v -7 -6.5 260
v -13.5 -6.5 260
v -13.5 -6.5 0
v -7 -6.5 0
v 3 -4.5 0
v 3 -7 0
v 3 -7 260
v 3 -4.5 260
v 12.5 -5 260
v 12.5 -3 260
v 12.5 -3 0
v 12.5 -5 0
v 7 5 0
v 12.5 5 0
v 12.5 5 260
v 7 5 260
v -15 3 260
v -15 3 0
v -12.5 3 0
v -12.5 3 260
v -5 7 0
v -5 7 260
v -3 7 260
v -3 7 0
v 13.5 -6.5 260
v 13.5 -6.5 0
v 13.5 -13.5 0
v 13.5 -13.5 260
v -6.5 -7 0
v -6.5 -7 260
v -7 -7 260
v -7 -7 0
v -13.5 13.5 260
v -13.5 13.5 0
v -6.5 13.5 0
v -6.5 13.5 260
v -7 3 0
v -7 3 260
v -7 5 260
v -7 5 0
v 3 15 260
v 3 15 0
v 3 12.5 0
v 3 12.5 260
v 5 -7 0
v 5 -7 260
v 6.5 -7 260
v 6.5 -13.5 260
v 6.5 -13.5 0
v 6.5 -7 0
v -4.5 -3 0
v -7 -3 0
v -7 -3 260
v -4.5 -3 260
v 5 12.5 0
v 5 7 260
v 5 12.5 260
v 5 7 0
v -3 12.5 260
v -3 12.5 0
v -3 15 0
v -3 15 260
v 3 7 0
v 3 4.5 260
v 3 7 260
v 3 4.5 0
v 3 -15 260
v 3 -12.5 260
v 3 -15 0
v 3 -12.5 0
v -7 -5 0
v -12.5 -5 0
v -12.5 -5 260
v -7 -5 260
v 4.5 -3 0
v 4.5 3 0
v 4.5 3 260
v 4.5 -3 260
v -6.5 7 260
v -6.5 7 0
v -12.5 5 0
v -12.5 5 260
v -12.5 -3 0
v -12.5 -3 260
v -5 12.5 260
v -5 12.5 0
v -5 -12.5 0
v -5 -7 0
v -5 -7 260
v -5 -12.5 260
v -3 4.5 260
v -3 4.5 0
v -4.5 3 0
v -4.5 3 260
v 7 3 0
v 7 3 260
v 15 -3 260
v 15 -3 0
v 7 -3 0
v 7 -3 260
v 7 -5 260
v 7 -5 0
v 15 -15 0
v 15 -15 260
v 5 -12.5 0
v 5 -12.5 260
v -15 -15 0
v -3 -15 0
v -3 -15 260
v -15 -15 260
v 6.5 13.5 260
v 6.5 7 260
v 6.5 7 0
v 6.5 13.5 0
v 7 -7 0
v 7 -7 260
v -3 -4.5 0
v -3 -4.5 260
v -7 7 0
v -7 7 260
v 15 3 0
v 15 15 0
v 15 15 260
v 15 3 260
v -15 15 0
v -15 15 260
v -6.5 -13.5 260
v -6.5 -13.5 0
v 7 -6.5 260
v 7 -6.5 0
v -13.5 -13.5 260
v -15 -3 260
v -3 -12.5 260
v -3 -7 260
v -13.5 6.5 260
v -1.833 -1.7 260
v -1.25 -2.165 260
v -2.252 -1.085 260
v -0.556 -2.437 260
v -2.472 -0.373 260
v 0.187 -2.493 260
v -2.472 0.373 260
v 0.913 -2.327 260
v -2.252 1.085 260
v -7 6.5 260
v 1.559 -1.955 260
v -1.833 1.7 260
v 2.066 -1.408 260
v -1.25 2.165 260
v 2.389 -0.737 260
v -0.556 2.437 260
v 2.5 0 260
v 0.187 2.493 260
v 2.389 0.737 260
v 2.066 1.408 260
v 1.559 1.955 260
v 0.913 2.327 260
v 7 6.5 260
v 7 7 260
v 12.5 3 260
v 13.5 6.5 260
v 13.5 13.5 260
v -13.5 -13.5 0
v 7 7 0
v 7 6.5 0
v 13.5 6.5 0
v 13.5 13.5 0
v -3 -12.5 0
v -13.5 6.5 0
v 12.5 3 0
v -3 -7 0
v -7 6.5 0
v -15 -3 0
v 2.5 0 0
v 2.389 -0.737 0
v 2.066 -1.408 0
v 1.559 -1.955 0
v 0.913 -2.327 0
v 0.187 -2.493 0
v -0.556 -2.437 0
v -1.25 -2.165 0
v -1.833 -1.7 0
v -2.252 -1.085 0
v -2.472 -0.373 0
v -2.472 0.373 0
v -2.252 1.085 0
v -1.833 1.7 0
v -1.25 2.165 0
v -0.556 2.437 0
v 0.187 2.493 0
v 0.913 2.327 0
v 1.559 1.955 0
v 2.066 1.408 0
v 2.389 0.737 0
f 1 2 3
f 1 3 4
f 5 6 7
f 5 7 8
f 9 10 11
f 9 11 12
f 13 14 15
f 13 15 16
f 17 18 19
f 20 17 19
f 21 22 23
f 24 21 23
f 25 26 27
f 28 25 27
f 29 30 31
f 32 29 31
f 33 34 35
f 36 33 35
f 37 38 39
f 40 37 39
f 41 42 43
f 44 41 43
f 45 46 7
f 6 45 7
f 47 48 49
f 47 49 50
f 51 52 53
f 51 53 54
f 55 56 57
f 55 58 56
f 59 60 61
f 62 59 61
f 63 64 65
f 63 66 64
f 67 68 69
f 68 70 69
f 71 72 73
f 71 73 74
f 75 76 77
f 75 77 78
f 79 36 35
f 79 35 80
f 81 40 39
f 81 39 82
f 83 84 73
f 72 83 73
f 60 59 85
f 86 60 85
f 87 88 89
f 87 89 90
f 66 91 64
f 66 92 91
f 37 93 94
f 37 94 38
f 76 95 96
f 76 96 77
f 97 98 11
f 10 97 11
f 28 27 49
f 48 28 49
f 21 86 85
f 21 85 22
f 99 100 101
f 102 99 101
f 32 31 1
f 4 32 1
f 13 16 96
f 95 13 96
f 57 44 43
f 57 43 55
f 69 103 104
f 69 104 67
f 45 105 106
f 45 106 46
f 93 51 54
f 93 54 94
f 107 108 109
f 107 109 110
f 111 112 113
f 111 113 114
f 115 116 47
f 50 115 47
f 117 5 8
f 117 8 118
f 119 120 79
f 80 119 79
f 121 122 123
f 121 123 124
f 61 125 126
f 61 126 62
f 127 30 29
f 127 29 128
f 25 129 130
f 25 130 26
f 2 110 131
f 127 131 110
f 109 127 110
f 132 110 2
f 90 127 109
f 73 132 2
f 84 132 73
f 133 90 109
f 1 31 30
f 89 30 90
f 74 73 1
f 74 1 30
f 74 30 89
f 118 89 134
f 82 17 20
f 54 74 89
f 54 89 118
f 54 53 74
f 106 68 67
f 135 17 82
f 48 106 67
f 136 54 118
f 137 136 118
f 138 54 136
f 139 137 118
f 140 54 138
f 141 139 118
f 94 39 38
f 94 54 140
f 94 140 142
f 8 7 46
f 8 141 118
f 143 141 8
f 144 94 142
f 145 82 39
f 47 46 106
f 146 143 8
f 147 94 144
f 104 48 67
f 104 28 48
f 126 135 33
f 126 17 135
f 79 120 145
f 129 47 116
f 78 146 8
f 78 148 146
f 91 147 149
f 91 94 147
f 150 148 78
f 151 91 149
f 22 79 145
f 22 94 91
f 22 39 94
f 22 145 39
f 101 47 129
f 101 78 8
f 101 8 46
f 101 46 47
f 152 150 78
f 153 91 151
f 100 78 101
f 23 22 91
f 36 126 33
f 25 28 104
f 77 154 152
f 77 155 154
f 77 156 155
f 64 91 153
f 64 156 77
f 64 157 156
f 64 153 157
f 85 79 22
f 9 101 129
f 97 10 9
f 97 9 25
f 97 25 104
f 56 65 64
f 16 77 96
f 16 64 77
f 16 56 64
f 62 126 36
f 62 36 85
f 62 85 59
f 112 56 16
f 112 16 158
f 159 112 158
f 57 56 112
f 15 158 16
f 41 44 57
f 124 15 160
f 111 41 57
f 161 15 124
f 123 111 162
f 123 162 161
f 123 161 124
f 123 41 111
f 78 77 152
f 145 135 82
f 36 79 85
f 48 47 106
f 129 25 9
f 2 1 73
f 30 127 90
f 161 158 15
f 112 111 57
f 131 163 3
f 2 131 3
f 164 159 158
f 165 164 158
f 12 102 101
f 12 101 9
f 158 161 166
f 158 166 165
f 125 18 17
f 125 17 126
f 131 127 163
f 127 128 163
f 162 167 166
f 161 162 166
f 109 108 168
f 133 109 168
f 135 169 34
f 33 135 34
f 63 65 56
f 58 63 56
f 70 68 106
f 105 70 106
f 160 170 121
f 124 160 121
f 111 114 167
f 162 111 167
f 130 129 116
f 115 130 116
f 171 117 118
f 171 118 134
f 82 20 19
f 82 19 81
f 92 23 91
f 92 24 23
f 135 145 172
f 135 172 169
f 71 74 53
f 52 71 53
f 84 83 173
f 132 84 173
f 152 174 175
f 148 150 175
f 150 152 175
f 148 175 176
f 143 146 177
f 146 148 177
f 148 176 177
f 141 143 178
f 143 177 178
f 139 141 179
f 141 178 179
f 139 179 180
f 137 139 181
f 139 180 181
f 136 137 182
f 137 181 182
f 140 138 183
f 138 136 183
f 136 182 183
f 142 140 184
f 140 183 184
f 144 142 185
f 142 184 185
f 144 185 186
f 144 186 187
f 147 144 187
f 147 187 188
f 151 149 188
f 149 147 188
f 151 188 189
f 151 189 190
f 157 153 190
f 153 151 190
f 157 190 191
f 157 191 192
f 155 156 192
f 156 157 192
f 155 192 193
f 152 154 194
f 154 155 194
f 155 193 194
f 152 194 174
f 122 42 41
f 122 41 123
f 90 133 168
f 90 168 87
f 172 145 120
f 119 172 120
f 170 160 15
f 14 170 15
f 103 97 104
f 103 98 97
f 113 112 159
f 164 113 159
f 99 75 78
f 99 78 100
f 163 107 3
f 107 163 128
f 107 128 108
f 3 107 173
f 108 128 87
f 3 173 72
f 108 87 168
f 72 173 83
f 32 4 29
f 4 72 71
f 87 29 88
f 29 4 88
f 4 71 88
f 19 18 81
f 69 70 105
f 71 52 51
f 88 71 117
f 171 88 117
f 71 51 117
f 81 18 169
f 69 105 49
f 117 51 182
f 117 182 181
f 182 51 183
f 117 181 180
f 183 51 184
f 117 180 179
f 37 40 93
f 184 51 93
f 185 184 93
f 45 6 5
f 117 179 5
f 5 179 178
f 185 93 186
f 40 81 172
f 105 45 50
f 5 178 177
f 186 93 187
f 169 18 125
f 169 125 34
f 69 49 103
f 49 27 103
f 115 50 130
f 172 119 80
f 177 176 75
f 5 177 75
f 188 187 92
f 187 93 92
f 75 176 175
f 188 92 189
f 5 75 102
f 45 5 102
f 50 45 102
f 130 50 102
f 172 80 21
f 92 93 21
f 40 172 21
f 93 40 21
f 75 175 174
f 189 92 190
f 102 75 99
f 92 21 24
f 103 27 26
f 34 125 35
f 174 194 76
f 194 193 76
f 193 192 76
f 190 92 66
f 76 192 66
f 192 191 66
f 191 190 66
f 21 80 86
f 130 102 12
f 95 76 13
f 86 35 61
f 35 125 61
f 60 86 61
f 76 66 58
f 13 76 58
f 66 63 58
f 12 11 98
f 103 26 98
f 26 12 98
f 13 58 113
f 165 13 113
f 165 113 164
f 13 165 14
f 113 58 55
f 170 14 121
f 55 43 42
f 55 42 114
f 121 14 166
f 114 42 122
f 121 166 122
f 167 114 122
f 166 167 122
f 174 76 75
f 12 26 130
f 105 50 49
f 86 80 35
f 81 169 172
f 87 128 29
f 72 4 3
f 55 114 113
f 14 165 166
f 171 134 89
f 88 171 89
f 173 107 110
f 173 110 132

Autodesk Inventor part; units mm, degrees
ref_plane "YZ Plane" through (0, 0, 0) normal (1, 0, 0) x (0, 1, 0)
ref_plane "XZ Plane" through (0, 0, 0) normal (0, 1, 0) x (-1, 0, 0)
ref_plane "XY Plane" through (0, 0, 0) normal (0, 0, 1) x (1, 0, 0)
sketch "スケッチ1" plane through (0, 0, 0) normal (0, 0, 1) x (1, 0, 0)
  circle A0 centre (0, 0) radius 2.5
  line L0 (-15, 15) -> (15, 15)
  line L1 (15, 15) -> (15, -15)
  line L2 (15, -15) -> (-15, -15)
  line L3 (-15, -15) -> (-15, 15)
  line L4 (-15, 15) -> (15, -15) construction
  line L5 (15, 15) -> (-15, -15) construction
  line L6 (-3, 17.5) -> (3, 17.5)
  line L7 (3, 17.5) -> (3, 12.5)
  line L8 (3, 12.5) -> (-3, 12.5) construction
  line L9 (-3, 12.5) -> (-3, 17.5)
  line L10 (-3, 17.5) -> (3, 12.5) construction
  line L11 (3, 17.5) -> (-3, 12.5) construction
  line L12 (4.5, -4.5) -> (-4.5, -4.5)
  line L13 (-4.5, -4.5) -> (-4.5, 4.5)
  line L14 (-4.5, 4.5) -> (4.5, 4.5)
  line L15 (4.5, 4.5) -> (4.5, -4.5)
  line L16 (4.5, -4.5) -> (-4.5, 4.5) construction
  line L17 (-4.5, -4.5) -> (4.5, 4.5) construction
  line L18 (-7, 7) -> (7, 7)
  line L19 (7, 7) -> (7, -7)
  line L20 (7, -7) -> (-7, -7)
  line L21 (-7, -7) -> (-7, 7)
  line L22 (-7, 7) -> (7, -7) construction
  line L23 (7, 7) -> (-7, -7) construction
  line L24 (-7, 7) -> (-3, 7)
  line L25 (-3, 7) -> (-3, 3)
  line L26 (-3, 3) -> (-7, 3)
  line L27 (-7, 3) -> (-7, 7)
  line L28 (-7, -3) -> (-3, -3)
  line L29 (-3, -3) -> (-3, -7)
  line L30 (3, -7) -> (3, -3)
  line L31 (3, -3) -> (7, -3)
  line L32 (7, 3) -> (3, 3)
  line L33 (3, 3) -> (3, 7)
  line L34 (-15, 15) -> (-5, 15)
  line L35 (-5, 15) -> (-5, 5)
  line L36 (-5, 5) -> (-15, 5)
  line L37 (-15, 5) -> (-15, 15)
  line L38 (-15, -5) -> (-5, -5)
  line L39 (-5, -5) -> (-5, -15)
  line L40 (5, -15) -> (5, -5)
  line L41 (5, -5) -> (15, -5)
  line L42 (15, 5) -> (5, 5)
  line L43 (5, 5) -> (5, 15)
  line L44 (-3, 12.5) -> (-5, 12.5)
  line L45 (3, 12.5) -> (5, 12.5)
  line L46 (-12.5, -3) -> (-12.5, -5)
  line L47 (-12.5, -3) -> (-17.5, -3)
  line L48 (-17.5, 3) -> (-12.5, 3)
  line L49 (-12.5, 3) -> (-12.5, 5)
  line L50 (3, -12.5) -> (5, -12.5)
  line L51 (3, -12.5) -> (3, -17.5)
  line L52 (-3, -17.5) -> (-3, -12.5)
  line L53 (-3, -12.5) -> (-5, -12.5)
  line L54 (12.5, 3) -> (12.5, 5)
  line L55 (12.5, 3) -> (17.5, 3)
  line L56 (17.5, -3) -> (12.5, -3)
  line L57 (12.5, -3) -> (12.5, -5)
  line L58 (-13.5, 13.5) -> (-6.5, 13.5)
  line L59 (-6.5, 13.5) -> (-6.5, 6.5)
  line L60 (-6.5, 6.5) -> (-13.5, 6.5)
  line L61 (-13.5, 6.5) -> (-13.5, 13.5)
  point P0 (0, 15)
  point P1 (-7, 5)
  point P2 (-4.5, 3)
  point P3 (-4.5, -3)
  point P4 (-7, -5)
  point P5 (-15, -3)
  point P6 (-3, -15)
  point P7 (-5, -7)
  point P8 (-3, -4.5)
  point P9 (3, -4.5)
  point P10 (5, -7)
  point P11 (3, -15)
  point P12 (15, -3)
  point P13 (7, -5)
  point P14 (4.5, -3)
  point P15 (4.5, 3)
  point P16 (7, 5)
  point P17 (15, 3)
  point P18 (3, 15)
  point P19 (5, 7)
  point P20 (3, 4.5)
  point P21 (-3, 4.5)
  point P22 (-5, 7)
  point P23 (-3, 15)
  point P24 (-15, 3)
  point P25 (-7, 6.5)
  point P26 (-6.5, 7)
  dimension "d0" = 5
  dimension "d1" = 30
  dimension "d2" = 30
  dimension "d3" = 6
  dimension "d4" = 5
  dimension "d5" = 9
  dimension "d6" = 9
  dimension "d7" = 14
  dimension "d8" = 14
  dimension "d9" = 4
  dimension "d10" = 4
  dimension "d13" = 360
  dimension "d15" = 10
  dimension "d16" = 10
  dimension "d19" = 360
  dimension "d23" = 360
  dimension "d27" = 1.5
  dimension "d28" = 7
extrude "押し出し1" add sketch "スケッチ1" along normal blind 260 contours L0 L35 L18 L59 L58 L61 L60 L21 L36 L3 | L0 L9 L44 L35 | L36 L49 L48 L3 | L0 L43 L45 L7 | L35 L36 L21 L60 L59 L18 | L18 L25 L14 L13 L26 L21 L36 L35 | L47 L46 L38 L3 | L0 L1 L42 L19 L18 L43 | L59 L60 L21 L18 | L18 L21 L60 L61 L58 L59 | L38 L21 L20 L39 L2 L3 | L18 L43 L42 L19 L32 L15 L14 L33 | L25 L26 L13 L14 | L14 L33 L32 L15 L31 L30 L12 L29 L28 L13 L26 L25 | L28 L13 L12 L29 L20 L39 L38 L21 | L1 L55 L54 L42 | L18 L19 L42 L43 | L14 L15 L32 L33 | L39 L53 L52 L2 | L38 L39 L20 L21 | L28 L29 L12 L13 | L1 L41 L57 L56 | L51 L50 L40 L2 | L1 L2 L40 L20 L19 L41 | L31 L19 L41 L40 L20 L30 L12 L15 | L15 L12 L30 L31 | L19 L20 L40 L41
extrude "押し出し2" cut sketch "スケッチ1" along normal blind 260 contours L18 L21 L60 L61 L58 L59
pattern_circular "円形状パターン1" count 4 over 360 about axis through (0, 0, 0) along (0, 0, 1) of "押し出し2"
properties part number "baicPart" material "アルミニウム"
